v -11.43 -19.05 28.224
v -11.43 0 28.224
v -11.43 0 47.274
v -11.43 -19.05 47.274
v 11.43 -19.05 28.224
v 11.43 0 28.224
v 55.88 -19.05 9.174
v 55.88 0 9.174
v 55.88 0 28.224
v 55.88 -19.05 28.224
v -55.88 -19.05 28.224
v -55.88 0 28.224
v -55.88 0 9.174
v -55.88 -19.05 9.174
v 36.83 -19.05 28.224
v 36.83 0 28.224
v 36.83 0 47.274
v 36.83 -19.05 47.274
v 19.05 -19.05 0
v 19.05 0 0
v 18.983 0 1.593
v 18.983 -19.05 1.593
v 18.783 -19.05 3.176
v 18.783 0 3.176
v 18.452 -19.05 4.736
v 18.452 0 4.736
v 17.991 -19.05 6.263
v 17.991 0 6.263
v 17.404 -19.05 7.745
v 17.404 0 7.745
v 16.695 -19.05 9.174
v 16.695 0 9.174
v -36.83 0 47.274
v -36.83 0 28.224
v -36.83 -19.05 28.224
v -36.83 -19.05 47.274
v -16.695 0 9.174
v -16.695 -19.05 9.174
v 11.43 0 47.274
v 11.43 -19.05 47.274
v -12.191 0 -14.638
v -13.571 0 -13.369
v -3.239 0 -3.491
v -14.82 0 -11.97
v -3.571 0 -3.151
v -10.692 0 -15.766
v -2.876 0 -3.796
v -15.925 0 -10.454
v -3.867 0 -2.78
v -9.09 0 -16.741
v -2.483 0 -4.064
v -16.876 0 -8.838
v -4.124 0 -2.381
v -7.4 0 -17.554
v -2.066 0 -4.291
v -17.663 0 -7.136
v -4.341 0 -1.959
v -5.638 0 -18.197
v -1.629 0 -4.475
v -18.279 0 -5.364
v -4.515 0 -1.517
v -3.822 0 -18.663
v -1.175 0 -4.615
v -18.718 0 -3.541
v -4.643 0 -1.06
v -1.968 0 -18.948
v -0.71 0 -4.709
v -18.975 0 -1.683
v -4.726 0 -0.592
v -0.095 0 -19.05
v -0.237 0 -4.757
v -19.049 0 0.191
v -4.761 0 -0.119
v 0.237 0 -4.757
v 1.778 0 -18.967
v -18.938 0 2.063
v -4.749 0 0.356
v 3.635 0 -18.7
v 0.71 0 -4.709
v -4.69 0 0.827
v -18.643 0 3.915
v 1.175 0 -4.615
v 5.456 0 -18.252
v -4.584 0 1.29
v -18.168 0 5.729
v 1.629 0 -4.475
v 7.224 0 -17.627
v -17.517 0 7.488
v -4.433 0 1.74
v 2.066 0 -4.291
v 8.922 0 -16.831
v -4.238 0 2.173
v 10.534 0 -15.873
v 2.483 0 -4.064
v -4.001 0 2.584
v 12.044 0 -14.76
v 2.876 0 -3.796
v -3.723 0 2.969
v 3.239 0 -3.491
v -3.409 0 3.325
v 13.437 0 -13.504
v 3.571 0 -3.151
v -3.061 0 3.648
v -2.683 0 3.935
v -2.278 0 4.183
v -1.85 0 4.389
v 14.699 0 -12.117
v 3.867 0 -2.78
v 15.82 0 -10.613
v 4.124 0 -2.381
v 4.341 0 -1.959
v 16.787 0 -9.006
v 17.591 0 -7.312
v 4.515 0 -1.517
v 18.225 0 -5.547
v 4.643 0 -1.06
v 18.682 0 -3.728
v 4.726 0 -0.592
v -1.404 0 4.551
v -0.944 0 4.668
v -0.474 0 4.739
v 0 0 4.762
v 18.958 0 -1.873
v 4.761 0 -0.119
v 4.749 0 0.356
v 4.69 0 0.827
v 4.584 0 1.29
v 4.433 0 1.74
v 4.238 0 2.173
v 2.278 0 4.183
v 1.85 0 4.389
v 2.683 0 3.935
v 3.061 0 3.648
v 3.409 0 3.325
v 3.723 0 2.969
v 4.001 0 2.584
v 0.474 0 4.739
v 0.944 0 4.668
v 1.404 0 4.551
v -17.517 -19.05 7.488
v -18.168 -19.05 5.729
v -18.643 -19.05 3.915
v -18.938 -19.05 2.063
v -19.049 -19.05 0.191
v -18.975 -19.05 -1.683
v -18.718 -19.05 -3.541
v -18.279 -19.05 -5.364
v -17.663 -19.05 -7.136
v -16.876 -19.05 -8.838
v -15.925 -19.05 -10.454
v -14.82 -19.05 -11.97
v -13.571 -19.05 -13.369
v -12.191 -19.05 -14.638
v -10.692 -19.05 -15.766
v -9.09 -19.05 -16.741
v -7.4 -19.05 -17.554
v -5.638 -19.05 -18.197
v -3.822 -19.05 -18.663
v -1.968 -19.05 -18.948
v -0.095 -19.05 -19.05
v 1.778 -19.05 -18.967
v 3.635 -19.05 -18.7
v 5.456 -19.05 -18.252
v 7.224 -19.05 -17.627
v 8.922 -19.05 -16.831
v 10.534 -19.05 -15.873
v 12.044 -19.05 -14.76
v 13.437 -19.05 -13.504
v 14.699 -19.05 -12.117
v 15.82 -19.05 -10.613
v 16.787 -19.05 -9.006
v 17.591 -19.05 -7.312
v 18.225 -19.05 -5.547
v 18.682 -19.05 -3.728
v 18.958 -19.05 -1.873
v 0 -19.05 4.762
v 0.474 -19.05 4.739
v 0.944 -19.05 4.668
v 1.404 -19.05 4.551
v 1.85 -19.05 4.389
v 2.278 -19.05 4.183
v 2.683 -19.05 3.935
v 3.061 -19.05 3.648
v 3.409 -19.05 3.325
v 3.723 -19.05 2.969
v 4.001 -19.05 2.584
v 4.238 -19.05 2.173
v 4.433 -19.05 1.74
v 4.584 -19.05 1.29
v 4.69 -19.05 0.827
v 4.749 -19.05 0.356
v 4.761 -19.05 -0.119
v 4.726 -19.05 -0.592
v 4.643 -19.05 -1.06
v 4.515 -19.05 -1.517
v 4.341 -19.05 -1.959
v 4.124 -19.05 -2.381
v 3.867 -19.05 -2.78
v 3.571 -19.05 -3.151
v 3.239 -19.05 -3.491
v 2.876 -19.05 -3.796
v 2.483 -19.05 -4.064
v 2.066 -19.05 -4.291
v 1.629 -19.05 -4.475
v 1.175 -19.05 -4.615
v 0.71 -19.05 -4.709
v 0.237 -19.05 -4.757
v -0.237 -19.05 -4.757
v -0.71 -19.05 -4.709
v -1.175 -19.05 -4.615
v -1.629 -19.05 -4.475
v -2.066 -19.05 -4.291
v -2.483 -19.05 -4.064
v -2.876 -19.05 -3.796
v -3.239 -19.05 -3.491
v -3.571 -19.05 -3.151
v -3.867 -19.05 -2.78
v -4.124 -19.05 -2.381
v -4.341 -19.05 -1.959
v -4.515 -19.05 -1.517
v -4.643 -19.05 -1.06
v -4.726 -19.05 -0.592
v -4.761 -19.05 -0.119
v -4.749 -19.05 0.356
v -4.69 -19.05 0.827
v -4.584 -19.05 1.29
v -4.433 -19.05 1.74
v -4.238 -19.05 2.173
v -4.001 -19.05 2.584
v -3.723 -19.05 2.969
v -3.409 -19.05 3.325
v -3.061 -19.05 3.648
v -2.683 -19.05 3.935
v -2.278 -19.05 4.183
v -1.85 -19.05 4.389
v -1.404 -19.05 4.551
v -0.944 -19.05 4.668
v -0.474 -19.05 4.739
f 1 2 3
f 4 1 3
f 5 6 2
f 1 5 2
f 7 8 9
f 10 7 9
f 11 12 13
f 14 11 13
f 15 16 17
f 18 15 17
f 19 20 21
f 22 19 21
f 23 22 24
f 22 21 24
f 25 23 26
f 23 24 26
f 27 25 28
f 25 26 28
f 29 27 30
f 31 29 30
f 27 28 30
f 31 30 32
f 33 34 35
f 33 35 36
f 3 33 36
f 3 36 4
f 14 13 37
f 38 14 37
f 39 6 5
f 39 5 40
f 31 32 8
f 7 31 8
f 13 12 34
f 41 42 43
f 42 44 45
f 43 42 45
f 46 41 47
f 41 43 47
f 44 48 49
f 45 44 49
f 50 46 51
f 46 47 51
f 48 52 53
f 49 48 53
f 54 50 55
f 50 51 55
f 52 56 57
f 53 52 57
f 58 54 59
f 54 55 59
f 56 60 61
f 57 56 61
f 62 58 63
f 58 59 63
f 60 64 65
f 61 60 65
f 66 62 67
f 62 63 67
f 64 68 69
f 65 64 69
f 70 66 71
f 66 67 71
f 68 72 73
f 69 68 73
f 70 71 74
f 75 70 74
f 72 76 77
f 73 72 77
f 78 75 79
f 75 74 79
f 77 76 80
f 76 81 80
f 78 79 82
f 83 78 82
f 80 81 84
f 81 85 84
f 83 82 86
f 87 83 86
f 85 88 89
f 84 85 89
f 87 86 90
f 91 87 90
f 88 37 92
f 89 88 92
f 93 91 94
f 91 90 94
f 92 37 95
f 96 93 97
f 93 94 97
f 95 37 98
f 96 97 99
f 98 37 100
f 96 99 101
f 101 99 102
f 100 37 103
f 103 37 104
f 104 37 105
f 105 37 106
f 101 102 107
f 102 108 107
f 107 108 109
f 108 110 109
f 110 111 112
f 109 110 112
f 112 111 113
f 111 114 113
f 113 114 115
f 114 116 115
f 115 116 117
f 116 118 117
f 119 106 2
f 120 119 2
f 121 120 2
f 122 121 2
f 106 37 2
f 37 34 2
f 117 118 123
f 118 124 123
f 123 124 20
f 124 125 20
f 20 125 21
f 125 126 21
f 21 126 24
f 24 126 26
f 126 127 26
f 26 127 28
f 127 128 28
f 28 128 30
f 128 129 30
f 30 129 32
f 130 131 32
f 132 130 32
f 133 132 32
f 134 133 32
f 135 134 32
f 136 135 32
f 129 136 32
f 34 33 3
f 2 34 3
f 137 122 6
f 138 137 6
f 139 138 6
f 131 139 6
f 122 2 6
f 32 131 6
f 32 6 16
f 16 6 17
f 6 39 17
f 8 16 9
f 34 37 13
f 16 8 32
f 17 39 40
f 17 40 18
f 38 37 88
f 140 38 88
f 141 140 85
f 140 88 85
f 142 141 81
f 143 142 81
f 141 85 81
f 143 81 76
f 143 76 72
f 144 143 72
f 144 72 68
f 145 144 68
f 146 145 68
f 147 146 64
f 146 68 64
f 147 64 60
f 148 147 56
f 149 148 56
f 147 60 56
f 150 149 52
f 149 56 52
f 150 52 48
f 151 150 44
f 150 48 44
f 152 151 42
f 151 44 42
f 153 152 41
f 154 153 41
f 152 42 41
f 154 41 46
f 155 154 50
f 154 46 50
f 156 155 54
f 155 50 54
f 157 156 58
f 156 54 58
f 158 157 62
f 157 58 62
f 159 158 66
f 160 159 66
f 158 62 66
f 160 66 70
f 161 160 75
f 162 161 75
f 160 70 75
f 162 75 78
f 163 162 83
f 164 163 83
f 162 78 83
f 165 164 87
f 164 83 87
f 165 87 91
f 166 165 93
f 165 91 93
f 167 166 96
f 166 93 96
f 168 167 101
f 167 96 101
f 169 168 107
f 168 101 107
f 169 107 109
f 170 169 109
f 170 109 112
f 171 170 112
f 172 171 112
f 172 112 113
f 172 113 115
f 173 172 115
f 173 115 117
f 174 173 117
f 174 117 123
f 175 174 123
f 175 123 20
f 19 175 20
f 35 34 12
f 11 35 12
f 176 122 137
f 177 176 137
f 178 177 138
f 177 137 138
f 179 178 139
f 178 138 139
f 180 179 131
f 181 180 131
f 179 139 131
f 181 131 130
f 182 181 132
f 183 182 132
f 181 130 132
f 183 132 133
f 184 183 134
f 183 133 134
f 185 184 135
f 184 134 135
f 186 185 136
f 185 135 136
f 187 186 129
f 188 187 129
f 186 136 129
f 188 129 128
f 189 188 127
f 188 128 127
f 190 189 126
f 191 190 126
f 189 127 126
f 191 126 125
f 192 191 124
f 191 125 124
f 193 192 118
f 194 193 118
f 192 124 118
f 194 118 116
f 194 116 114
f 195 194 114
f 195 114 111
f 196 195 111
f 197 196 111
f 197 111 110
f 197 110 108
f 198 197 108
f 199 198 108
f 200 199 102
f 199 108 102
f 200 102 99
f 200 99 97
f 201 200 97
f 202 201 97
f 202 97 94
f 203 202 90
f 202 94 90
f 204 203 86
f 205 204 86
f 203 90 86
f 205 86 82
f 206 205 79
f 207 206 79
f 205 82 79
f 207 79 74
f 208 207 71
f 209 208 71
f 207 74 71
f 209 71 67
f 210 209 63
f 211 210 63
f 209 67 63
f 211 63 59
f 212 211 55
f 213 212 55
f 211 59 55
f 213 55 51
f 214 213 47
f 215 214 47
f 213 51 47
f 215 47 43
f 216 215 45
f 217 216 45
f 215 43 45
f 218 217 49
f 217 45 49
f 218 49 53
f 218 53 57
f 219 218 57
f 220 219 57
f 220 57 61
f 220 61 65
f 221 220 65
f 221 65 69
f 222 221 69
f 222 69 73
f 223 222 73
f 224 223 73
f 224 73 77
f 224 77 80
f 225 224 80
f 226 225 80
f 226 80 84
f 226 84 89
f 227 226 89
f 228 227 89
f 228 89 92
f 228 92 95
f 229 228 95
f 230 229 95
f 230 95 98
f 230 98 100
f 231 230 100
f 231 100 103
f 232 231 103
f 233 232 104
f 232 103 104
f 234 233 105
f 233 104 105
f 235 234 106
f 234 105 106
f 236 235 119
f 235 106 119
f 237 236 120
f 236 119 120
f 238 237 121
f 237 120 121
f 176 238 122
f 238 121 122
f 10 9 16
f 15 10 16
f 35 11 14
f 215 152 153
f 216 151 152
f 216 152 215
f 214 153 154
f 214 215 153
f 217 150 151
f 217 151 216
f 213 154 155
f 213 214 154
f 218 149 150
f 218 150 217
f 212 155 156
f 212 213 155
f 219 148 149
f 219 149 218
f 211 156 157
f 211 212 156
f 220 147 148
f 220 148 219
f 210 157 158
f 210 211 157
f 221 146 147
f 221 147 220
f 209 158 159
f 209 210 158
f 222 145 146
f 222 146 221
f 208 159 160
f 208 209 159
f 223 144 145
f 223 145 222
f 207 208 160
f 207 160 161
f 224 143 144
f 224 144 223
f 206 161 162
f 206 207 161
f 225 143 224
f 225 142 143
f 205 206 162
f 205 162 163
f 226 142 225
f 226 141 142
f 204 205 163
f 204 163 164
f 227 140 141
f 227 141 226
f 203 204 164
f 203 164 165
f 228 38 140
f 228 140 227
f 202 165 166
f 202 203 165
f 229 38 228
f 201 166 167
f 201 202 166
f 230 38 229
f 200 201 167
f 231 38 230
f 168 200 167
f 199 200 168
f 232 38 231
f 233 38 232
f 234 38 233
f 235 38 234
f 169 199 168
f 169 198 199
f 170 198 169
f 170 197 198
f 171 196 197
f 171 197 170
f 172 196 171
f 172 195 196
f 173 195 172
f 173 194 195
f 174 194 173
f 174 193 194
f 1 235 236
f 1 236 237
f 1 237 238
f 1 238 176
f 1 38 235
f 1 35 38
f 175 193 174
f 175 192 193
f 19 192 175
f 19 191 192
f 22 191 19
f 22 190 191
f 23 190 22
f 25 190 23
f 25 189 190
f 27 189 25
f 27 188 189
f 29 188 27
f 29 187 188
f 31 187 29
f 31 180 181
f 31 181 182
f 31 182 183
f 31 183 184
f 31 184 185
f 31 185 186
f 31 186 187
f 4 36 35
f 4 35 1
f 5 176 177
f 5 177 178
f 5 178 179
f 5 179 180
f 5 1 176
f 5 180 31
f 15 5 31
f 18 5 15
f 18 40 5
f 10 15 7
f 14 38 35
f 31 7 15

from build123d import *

# Parameters (mm, degrees)
F0_W     = 25.4
F0_H     = 19.05
F1_DEPTH = 19.05


with BuildPart() as f1:
    # F0 (on Front) → F1 (new body)
    with BuildSketch(Plane.XZ):
        with BuildLine():
            ThreePointArc((-16.695471328, 9.1740796342), (-4.7357032847, -18.4519813137), (19.05, 0))
            ThreePointArc((19.05, 0), (18.4519813137, 4.7357032847), (16.695471328, 9.1740796342))
            Line((16.695471328, 9.1740796342), (0, 9.1740796342))
            Line((0, 9.1740796342), (-16.695471328, 9.1740796342))
        make_face()
        with BuildLine():
            ThreePointArc((4.7625, 0), (-3.3675960454, -3.3675960454), (0, 4.7625))
            ThreePointArc((0, 4.7625), (3.3675960454, 3.3675960454), (4.7625, 0))
        make_face(mode=Mode.SUBTRACT)
        with BuildLine():
            Line((0, 9.1740796342), (16.695471328, 9.1740796342))
            ThreePointArc((16.695471328, 9.1740796342), (9.6988732069, 16.3961690195), (0, 19.05))
            Line((0, 19.05), (0, 9.1740796342))
        make_face()
        with BuildLine():
            ThreePointArc((0, 19.05), (9.6988732069, 16.3961690195), (16.695471328, 9.1740796342))
            Line((16.695471328, 9.1740796342), (55.88, 9.1740796342))
            Line((55.88, 9.1740796342), (55.88, 28.2240796342))
            Line((55.88, 28.2240796342), (36.83, 28.2240796342))
            Line((36.83, 28.2240796342), (11.43, 28.2240796342))
            Line((11.43, 28.2240796342), (-11.43, 28.2240796342))
            Line((-11.43, 28.2240796342), (-36.83, 28.2240796342))
            Line((-36.83, 28.2240796342), (-55.88, 28.2240796342))
            Line((-55.88, 28.2240796342), (-55.88, 9.1740796342))
            Line((-55.88, 9.1740796342), (-16.695471328, 9.1740796342))
            ThreePointArc((-16.695471328, 9.1740796342), (-9.6988732069, 16.3961690195), (0, 19.05))
        make_face()
        with BuildLine():
            ThreePointArc((0, 19.05), (-9.6988732069, 16.3961690195), (-16.695471328, 9.1740796342))
            Line((-16.695471328, 9.1740796342), (0, 9.1740796342))
            Line((0, 9.1740796342), (0, 19.05))
        make_face()
        with Locations((24.13, 37.7490796342)):
            Rectangle(F0_W, F0_H)
        with Locations((-24.13, 37.7490796342)):
            Rectangle(F0_W, F0_H)
    extrude(amount=F1_DEPTH)


solid = f1.part
